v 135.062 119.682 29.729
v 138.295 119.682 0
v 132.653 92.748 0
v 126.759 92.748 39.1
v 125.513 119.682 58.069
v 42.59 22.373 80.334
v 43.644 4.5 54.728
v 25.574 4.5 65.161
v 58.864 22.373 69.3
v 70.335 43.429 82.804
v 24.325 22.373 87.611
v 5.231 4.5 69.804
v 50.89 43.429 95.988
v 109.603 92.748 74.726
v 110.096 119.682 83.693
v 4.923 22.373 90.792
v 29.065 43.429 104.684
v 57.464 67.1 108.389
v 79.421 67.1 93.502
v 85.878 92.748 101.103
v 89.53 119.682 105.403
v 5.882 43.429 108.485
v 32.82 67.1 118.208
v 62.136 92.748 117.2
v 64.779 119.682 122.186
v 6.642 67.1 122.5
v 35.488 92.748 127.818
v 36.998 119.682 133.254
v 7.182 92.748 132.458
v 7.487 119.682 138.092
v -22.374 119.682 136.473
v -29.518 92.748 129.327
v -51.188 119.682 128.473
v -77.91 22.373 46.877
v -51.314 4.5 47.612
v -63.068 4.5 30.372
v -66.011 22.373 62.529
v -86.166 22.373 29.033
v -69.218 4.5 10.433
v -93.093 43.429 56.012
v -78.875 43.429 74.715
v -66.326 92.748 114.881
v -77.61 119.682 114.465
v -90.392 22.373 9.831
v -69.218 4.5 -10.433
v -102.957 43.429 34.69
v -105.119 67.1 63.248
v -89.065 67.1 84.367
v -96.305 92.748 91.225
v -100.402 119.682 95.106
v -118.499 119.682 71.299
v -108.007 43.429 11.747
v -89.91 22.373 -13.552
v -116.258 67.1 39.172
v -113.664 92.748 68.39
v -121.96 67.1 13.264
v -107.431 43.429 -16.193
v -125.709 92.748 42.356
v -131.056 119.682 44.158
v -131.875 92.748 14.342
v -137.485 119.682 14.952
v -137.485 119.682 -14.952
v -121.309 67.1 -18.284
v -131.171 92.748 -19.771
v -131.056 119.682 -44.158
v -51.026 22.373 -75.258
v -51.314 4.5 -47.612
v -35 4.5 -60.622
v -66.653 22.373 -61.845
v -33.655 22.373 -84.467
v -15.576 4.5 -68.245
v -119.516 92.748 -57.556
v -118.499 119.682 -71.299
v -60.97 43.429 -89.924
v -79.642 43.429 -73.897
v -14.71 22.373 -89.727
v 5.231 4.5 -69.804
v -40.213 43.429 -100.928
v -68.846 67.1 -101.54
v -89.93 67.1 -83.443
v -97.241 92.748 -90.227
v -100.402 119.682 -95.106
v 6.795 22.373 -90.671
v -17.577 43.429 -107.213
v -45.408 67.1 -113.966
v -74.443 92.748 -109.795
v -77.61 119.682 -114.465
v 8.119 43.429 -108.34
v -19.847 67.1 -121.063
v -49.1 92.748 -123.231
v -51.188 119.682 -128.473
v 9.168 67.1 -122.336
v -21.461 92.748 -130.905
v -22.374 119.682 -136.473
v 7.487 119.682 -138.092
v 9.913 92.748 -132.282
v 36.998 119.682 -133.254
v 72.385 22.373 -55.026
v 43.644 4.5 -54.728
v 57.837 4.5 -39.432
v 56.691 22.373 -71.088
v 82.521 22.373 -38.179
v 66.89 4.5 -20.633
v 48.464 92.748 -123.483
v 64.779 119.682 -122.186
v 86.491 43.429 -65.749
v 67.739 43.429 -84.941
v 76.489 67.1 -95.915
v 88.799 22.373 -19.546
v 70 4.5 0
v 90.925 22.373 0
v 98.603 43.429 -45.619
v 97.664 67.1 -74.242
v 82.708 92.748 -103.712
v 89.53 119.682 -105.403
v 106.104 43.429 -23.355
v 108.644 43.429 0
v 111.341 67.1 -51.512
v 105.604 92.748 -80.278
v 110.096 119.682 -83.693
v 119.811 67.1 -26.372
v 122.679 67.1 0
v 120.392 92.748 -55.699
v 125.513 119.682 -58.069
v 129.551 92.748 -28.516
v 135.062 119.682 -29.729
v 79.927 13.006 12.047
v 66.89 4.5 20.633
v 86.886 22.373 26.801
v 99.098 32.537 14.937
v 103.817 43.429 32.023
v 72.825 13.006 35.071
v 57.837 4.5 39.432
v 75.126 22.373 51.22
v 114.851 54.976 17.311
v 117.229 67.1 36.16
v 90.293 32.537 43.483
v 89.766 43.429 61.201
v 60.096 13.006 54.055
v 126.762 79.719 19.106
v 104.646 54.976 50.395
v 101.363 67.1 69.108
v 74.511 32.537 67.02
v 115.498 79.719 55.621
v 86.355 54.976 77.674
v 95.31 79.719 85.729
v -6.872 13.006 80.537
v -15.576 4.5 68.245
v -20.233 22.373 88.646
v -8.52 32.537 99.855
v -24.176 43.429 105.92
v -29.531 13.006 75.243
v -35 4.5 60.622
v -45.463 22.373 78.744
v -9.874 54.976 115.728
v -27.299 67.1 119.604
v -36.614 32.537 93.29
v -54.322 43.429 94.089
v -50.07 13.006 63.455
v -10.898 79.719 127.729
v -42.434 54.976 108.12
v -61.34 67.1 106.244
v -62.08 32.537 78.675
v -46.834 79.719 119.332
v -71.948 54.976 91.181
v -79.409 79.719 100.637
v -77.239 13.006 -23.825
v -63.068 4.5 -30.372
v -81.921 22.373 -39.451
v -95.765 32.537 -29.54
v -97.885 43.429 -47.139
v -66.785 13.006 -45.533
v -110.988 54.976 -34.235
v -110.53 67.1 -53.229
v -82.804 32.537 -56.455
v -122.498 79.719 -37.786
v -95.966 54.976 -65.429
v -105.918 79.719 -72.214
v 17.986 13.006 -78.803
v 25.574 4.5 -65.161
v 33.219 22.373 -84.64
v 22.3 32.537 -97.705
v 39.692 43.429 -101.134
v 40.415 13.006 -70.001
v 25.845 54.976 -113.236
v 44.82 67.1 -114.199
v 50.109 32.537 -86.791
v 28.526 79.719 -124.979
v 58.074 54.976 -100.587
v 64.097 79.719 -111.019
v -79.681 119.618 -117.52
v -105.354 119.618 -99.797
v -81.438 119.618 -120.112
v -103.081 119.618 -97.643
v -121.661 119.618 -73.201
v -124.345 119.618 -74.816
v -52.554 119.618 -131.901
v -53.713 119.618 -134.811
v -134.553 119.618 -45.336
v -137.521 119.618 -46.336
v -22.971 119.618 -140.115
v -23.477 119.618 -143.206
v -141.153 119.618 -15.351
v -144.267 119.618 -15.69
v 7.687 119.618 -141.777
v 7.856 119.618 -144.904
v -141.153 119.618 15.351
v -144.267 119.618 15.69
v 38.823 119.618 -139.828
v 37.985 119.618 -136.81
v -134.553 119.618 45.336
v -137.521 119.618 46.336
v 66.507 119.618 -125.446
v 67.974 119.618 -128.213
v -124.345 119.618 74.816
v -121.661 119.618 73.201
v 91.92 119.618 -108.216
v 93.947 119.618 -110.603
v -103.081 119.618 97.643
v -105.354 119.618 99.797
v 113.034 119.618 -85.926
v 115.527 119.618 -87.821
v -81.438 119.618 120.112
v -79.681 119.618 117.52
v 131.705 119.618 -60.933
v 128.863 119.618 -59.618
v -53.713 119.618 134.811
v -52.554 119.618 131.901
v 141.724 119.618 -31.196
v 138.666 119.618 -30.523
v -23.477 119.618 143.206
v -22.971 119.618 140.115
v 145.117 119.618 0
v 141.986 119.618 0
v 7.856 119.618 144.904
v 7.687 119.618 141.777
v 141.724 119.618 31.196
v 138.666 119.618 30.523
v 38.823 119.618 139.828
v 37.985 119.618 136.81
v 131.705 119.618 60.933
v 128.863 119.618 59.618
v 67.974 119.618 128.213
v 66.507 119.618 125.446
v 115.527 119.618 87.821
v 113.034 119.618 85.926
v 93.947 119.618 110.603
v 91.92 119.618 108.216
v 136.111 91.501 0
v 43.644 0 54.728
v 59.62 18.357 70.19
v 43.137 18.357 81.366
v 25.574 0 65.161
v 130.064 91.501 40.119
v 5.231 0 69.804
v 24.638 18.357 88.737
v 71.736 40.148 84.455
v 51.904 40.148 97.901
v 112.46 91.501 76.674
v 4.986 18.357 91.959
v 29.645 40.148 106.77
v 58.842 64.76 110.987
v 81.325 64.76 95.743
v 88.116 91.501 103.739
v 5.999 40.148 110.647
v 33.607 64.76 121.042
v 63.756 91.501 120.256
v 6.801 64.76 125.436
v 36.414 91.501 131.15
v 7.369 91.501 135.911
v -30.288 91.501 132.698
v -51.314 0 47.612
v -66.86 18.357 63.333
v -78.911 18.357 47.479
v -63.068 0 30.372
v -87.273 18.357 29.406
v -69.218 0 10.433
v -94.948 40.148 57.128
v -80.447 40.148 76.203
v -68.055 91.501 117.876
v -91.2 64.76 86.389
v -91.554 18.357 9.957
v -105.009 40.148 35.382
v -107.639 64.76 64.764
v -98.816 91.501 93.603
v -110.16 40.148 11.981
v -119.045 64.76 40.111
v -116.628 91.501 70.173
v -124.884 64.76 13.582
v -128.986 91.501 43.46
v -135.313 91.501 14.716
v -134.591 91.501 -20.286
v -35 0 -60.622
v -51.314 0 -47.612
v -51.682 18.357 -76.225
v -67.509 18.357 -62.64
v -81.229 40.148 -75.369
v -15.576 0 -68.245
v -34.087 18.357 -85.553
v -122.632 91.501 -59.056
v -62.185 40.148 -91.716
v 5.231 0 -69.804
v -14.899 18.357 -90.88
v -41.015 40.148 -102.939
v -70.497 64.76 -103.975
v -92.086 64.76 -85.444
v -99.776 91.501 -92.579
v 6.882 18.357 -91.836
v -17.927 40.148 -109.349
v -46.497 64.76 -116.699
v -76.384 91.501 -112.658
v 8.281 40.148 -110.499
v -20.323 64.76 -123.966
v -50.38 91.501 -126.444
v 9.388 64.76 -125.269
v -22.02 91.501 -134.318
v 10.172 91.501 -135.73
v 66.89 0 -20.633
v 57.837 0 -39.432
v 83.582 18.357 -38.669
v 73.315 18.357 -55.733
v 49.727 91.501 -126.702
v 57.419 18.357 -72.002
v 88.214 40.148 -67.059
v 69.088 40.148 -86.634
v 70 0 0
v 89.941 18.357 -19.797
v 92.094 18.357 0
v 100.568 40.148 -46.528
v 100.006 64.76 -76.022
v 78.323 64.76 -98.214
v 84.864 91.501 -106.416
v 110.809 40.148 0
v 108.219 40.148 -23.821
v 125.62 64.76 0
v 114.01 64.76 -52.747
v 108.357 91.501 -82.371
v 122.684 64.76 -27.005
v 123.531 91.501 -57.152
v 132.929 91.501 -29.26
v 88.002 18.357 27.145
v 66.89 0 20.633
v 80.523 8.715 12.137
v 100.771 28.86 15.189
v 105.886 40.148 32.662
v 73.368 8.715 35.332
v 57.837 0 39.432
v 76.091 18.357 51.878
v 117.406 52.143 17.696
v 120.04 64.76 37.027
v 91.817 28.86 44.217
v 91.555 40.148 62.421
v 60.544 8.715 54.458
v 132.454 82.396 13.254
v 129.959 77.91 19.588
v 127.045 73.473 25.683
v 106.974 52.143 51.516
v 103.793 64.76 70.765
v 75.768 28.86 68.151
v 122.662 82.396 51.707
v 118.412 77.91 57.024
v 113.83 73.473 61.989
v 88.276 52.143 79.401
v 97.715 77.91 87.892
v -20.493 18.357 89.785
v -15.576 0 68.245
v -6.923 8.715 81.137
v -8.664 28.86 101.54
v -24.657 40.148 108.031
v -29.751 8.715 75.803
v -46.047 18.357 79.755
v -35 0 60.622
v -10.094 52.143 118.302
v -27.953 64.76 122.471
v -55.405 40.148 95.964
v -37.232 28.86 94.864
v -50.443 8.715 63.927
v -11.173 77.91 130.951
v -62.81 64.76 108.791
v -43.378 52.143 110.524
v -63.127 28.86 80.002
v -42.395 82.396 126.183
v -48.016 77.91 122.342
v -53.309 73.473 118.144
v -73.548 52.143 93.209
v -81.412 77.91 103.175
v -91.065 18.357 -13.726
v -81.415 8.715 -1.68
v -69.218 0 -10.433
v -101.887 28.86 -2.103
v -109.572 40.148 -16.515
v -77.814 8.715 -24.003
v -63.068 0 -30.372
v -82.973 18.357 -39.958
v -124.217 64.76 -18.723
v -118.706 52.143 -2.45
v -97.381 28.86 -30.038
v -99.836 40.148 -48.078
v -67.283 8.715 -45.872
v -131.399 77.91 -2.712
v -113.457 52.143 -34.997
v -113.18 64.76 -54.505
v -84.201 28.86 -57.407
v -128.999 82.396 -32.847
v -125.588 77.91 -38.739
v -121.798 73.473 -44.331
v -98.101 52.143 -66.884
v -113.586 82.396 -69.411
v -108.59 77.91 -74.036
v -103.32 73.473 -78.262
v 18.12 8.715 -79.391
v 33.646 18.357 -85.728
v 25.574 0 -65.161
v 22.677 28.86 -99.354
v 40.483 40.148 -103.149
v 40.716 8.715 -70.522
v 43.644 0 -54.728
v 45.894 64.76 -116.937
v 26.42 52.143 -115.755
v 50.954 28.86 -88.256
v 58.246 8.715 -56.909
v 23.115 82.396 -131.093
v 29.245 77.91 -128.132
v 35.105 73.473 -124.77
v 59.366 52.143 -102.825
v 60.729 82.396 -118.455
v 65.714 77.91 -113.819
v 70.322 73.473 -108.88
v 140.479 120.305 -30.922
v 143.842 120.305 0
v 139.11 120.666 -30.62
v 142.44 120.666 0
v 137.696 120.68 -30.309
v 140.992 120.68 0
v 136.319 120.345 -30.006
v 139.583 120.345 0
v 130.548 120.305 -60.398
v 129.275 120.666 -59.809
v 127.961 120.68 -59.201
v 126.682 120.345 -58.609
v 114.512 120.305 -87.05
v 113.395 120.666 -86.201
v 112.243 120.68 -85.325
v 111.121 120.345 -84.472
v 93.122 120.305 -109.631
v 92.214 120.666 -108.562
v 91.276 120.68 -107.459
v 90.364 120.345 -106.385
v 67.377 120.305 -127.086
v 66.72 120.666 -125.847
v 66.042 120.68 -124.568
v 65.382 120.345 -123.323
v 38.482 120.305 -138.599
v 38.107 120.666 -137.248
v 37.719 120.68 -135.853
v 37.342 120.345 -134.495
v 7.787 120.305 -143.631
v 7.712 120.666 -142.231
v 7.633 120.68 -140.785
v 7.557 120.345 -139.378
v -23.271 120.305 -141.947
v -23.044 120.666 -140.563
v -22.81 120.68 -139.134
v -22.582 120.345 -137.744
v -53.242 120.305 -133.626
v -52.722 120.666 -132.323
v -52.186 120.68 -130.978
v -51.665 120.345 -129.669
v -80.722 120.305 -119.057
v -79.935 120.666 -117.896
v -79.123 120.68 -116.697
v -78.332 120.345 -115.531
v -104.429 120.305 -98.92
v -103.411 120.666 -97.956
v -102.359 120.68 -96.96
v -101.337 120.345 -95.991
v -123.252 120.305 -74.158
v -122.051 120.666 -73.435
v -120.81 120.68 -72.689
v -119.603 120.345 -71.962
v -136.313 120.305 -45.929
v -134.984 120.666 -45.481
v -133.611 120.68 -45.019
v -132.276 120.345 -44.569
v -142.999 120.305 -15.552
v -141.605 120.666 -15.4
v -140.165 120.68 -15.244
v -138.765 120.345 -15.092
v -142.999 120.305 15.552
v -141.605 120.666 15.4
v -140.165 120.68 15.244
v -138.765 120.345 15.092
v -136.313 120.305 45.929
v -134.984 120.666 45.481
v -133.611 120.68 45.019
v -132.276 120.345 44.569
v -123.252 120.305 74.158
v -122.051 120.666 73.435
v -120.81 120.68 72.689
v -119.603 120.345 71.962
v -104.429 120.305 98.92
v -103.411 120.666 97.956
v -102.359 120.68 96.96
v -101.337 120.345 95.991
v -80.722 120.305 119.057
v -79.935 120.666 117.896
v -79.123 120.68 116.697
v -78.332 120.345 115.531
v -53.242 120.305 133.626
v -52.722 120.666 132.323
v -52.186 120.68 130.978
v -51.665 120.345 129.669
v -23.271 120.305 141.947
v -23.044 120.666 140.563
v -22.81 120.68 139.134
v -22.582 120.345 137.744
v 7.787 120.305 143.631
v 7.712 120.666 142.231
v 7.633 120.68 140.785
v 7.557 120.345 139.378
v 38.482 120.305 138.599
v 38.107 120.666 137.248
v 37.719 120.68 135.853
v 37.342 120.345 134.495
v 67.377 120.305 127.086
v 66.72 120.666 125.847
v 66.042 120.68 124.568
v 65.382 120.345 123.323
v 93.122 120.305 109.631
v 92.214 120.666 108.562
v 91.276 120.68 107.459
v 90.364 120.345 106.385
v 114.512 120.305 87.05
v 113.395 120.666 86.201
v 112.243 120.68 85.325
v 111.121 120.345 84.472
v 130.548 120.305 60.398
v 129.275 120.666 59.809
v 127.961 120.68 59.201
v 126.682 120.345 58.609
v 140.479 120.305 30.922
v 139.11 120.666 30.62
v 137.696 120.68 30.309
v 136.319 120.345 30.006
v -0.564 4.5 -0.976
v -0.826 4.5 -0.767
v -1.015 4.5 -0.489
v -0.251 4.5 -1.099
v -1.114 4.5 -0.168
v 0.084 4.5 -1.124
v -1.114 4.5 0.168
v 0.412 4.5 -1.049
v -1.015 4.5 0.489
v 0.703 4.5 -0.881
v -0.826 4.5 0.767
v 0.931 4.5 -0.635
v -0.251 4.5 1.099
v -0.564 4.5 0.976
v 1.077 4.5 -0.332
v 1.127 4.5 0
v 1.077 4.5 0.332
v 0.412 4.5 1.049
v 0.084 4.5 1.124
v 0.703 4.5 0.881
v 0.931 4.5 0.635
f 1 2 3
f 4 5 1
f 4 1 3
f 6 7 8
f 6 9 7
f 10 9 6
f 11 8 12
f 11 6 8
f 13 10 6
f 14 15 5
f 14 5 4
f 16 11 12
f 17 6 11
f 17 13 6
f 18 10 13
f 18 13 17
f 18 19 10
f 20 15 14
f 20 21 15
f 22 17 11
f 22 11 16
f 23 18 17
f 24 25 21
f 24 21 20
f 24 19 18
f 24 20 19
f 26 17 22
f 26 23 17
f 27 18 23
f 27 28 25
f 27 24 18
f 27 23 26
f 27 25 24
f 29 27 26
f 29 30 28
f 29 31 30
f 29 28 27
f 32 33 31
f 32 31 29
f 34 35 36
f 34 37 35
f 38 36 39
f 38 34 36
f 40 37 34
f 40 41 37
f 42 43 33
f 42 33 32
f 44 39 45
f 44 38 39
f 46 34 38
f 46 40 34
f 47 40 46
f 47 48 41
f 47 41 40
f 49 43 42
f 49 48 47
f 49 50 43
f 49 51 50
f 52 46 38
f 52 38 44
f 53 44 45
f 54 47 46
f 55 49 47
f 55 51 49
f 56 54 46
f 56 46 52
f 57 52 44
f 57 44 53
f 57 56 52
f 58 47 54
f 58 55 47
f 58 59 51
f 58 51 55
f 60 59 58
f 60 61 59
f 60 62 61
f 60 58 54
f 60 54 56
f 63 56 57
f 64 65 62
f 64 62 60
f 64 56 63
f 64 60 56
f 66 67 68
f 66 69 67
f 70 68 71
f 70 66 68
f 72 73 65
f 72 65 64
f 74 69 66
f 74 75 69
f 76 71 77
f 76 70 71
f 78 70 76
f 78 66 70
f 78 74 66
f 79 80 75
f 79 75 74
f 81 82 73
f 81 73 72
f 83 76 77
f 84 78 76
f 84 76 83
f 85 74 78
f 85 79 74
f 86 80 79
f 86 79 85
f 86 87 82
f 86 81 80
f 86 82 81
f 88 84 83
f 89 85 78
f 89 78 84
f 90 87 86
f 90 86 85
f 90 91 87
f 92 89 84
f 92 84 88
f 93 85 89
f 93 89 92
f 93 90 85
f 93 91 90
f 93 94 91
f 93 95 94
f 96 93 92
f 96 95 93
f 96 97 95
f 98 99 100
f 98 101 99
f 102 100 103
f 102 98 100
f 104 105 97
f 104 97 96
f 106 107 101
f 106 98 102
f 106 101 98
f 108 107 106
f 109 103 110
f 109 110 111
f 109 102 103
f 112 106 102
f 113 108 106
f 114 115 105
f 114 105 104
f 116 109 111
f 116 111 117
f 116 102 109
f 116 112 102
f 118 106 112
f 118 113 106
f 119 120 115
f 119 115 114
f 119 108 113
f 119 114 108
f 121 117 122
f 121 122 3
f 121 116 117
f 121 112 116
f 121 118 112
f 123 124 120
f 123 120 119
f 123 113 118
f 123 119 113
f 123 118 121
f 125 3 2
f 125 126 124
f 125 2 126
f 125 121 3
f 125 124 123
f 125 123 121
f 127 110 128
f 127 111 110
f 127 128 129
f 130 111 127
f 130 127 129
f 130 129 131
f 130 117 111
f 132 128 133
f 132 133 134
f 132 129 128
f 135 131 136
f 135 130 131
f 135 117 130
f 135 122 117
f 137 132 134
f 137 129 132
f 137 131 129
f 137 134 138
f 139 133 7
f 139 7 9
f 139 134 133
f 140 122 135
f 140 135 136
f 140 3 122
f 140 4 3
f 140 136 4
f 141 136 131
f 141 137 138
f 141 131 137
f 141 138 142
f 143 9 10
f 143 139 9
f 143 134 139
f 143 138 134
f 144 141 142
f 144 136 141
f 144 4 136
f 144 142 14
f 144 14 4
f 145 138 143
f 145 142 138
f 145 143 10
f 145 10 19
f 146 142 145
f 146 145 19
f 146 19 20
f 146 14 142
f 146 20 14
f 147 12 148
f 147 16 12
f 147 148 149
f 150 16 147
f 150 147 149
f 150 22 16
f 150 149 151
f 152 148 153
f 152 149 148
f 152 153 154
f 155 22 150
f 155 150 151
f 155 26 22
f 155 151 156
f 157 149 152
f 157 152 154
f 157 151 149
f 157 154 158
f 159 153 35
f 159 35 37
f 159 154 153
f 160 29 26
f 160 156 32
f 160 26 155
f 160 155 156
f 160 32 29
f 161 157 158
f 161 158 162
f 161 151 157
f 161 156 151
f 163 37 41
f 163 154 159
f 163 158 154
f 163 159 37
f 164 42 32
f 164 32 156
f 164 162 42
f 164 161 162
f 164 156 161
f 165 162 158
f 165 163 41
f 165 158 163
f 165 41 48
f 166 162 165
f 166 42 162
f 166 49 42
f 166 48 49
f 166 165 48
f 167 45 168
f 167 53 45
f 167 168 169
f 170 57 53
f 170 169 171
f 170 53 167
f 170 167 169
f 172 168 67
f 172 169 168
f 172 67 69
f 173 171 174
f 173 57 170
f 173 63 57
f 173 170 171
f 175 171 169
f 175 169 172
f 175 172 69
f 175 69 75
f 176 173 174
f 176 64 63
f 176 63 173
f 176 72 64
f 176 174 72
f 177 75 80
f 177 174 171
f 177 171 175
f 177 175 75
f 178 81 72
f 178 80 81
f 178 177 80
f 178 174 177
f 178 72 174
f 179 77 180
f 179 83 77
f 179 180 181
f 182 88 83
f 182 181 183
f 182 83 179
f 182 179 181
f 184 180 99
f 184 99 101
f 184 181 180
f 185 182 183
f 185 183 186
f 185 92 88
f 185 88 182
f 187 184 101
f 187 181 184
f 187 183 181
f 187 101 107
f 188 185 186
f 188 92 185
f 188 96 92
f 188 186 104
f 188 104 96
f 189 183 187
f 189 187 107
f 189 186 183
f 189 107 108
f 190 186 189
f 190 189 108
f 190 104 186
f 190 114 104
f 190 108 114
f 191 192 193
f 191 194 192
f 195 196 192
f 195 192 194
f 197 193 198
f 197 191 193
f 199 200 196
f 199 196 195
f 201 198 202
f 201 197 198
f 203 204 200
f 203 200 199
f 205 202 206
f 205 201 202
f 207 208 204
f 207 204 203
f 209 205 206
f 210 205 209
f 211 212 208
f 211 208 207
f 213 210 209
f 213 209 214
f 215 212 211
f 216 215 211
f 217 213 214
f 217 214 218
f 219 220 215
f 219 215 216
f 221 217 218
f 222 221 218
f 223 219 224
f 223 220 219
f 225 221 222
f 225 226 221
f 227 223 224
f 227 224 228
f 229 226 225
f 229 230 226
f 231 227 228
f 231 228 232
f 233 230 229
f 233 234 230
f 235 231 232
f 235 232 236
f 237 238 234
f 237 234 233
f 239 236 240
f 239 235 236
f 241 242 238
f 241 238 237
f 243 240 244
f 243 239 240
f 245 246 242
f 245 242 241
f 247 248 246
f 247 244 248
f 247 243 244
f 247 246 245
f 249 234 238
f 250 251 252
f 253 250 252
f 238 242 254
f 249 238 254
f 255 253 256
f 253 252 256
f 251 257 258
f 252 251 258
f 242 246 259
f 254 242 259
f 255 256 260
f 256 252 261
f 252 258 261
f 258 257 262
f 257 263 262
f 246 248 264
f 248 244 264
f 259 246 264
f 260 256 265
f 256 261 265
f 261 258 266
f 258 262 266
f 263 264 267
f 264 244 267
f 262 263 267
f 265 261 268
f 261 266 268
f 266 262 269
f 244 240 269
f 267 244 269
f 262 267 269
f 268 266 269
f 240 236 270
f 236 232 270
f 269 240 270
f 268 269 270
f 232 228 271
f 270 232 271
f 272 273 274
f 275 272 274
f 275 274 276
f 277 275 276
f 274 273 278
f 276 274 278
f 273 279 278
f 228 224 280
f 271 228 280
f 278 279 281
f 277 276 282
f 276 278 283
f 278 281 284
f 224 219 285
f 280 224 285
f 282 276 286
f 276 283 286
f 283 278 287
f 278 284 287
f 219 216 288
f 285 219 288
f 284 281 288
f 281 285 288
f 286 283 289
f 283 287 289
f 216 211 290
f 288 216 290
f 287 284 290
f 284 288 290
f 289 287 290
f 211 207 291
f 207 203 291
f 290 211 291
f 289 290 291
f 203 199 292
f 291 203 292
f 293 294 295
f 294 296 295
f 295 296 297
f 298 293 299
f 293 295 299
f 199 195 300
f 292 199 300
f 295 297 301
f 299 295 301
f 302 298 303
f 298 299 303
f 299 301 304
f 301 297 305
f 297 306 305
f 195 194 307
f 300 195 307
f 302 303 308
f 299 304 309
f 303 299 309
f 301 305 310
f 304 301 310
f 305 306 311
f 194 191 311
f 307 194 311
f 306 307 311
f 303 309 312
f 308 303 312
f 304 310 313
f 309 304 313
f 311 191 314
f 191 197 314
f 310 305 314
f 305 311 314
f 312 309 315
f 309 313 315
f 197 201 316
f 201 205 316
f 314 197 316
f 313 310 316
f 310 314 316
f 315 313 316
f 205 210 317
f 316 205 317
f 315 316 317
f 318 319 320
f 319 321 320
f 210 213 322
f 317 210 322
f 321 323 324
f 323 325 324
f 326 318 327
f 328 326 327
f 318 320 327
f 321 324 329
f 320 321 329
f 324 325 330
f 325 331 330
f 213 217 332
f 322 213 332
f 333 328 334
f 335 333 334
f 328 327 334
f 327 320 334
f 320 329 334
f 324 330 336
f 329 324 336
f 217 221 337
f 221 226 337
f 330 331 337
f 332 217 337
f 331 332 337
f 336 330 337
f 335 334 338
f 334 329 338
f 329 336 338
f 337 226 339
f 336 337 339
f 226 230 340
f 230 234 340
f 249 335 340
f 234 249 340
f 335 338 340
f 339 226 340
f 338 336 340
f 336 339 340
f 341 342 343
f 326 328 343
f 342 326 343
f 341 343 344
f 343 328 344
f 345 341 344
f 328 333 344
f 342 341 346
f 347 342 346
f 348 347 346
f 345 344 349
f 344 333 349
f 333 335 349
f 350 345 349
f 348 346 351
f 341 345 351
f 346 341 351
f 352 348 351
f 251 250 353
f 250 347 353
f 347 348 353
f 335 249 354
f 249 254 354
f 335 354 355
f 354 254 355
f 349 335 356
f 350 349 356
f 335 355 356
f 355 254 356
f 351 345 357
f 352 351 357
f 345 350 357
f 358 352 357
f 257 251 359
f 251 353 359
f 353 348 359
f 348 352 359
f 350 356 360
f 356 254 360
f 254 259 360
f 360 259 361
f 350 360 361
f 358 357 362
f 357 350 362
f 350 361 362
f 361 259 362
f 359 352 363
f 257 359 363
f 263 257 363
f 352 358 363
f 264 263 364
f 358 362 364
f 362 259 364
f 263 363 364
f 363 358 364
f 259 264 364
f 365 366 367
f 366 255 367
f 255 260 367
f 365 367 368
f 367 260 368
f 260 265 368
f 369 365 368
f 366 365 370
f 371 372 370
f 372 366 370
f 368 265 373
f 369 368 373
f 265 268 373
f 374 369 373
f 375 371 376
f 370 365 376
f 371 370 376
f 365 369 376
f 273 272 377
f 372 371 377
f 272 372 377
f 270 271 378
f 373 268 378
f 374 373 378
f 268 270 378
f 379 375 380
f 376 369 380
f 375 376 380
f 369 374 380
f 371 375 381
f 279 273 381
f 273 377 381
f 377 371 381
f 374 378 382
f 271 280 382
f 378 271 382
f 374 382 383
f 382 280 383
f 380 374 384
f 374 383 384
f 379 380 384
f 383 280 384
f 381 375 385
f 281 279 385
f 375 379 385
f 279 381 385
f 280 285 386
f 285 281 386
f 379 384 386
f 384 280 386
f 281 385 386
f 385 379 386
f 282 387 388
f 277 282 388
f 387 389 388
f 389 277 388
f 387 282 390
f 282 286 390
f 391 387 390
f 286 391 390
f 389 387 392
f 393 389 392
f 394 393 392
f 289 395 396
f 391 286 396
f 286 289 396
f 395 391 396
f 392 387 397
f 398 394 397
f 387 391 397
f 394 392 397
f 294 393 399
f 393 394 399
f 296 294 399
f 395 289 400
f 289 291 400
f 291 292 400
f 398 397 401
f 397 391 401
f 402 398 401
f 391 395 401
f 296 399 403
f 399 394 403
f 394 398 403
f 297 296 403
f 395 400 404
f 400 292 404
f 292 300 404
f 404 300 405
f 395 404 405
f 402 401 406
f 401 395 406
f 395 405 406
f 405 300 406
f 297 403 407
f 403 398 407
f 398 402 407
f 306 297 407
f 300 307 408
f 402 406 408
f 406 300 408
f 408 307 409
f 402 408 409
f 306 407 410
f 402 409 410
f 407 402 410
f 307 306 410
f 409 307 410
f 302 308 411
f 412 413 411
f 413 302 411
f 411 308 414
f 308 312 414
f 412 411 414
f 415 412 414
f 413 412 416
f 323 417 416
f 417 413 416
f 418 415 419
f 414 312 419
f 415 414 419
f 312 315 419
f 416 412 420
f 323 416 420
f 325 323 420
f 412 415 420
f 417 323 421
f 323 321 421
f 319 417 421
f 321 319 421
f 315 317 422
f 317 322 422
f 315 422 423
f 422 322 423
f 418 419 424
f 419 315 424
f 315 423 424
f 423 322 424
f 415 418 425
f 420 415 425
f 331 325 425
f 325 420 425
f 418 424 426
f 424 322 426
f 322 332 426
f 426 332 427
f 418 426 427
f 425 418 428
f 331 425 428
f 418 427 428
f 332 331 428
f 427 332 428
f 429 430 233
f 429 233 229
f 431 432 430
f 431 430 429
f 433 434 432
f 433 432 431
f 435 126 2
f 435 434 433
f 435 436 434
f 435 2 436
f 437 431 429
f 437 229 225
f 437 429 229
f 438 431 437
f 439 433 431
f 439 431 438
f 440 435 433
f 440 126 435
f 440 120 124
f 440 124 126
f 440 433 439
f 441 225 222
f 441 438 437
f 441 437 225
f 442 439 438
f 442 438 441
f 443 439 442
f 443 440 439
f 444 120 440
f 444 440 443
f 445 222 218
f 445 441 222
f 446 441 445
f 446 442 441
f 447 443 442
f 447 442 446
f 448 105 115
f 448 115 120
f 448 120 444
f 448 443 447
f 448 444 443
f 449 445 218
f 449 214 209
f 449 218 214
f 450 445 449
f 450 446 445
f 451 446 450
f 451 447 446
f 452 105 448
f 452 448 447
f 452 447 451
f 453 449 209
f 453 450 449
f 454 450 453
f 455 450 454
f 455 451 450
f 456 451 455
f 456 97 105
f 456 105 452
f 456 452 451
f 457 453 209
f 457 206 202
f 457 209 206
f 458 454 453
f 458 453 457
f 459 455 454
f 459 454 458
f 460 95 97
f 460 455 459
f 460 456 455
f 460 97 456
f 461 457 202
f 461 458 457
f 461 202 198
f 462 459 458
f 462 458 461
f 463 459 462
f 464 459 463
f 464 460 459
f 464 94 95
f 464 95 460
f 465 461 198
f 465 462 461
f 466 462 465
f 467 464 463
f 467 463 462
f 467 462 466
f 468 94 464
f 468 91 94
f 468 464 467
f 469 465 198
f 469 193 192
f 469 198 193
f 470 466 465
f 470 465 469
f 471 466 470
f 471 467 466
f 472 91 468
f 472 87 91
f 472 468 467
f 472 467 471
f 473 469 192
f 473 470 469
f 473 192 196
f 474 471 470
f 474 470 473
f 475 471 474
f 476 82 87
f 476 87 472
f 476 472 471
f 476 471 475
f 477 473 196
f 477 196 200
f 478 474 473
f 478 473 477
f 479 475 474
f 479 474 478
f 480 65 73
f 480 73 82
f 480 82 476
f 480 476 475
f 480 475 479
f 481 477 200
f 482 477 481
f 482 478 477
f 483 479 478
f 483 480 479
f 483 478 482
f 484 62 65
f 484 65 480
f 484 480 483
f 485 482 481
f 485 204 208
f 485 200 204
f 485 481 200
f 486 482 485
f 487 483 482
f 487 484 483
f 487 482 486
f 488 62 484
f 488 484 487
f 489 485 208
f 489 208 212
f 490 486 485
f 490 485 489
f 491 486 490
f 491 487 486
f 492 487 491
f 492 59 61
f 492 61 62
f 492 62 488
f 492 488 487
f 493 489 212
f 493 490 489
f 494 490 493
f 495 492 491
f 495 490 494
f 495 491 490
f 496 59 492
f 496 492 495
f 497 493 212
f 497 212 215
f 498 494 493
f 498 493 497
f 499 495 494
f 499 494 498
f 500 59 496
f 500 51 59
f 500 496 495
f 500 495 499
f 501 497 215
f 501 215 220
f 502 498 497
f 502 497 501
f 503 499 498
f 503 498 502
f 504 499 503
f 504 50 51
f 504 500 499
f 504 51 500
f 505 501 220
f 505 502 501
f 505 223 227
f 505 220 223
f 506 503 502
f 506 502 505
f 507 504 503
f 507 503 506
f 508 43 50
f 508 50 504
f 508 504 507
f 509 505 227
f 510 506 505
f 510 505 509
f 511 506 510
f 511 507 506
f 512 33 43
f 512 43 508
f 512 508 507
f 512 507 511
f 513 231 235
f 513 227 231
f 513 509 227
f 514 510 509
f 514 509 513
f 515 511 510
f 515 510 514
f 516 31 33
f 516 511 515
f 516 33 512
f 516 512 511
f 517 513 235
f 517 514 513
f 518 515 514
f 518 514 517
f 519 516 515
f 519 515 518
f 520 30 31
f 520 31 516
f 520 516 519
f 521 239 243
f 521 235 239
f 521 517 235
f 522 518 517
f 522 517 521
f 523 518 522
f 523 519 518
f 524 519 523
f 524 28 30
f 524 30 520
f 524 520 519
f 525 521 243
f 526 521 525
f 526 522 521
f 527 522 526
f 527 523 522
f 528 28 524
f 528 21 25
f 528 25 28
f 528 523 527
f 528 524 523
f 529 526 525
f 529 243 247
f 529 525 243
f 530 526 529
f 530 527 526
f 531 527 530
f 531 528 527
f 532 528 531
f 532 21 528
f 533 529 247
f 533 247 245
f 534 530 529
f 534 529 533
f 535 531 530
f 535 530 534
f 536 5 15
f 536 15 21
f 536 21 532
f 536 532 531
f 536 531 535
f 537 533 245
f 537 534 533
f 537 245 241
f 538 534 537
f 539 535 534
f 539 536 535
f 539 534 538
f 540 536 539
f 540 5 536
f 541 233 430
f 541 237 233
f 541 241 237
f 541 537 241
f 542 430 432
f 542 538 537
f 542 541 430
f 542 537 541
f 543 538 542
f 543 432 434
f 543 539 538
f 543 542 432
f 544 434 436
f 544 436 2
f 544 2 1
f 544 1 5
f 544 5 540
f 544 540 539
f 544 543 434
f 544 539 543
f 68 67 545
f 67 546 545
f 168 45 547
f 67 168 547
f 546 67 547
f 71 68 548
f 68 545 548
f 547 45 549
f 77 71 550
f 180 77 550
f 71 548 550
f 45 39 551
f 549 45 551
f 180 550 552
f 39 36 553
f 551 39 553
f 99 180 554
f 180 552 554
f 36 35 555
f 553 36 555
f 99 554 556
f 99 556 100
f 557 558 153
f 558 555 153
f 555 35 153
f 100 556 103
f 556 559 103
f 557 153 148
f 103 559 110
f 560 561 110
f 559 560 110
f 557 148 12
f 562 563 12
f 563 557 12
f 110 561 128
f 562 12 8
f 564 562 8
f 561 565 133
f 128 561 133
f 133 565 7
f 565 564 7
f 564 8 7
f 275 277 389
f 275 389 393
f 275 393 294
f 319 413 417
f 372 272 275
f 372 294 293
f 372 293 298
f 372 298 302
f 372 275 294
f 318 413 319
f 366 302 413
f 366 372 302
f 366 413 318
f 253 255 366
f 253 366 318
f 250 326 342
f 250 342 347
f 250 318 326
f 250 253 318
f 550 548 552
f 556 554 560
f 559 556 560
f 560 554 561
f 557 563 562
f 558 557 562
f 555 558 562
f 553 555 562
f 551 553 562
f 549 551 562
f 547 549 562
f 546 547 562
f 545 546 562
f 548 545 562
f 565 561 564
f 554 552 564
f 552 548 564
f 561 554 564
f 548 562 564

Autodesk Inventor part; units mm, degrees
ref_plane "YZ Plane" through (0, 0, 0) normal (1, 0, 0) x (0, 1, 0)
ref_plane "XZ Plane" through (0, 0, 0) normal (0, 1, 0) x (-1, 0, 0)
ref_plane "XY Plane" through (0, 0, 0) normal (0, 0, 1) x (1, 0, 0)
sketch "Esquisse1" plane through (0, 0, 0) normal (0, 0, 1) x (1, 0, 0)
  line L0 (0, 0) -> (70, 0)
  line L1 (1.127, 4.5) -> (70, 4.5)
  arc A0 (70, 4.5) -> (138.2953, 119.6825) centre (-28.041, 140.47) ccw
  arc A1 (145.1172, 119.6184) -> (138.2953, 119.6825) centre (141.66, 114.7284) ccw
  line L2 (145.1172, 119.6184) -> (141.9857, 119.6184)
  arc A2 (70, 0) -> (141.9857, 119.6184) centre (-28.041, 140.47) ccw
  line L3 (1.127, 4.5) -> (0, 4.5)
  line L4 (0, 4.5) -> (0, 0)
  line L5 (0, 137.8568) -> (0, -38.4638)
  dimension "d0" = 70
  dimension "d3" = 4.5
  dimension "d4" = 70
revolve "Révolution1" add sketch "Esquisse1" angle 360 about axis through (0, 137.8568, 0) along (0, -1, 0)
